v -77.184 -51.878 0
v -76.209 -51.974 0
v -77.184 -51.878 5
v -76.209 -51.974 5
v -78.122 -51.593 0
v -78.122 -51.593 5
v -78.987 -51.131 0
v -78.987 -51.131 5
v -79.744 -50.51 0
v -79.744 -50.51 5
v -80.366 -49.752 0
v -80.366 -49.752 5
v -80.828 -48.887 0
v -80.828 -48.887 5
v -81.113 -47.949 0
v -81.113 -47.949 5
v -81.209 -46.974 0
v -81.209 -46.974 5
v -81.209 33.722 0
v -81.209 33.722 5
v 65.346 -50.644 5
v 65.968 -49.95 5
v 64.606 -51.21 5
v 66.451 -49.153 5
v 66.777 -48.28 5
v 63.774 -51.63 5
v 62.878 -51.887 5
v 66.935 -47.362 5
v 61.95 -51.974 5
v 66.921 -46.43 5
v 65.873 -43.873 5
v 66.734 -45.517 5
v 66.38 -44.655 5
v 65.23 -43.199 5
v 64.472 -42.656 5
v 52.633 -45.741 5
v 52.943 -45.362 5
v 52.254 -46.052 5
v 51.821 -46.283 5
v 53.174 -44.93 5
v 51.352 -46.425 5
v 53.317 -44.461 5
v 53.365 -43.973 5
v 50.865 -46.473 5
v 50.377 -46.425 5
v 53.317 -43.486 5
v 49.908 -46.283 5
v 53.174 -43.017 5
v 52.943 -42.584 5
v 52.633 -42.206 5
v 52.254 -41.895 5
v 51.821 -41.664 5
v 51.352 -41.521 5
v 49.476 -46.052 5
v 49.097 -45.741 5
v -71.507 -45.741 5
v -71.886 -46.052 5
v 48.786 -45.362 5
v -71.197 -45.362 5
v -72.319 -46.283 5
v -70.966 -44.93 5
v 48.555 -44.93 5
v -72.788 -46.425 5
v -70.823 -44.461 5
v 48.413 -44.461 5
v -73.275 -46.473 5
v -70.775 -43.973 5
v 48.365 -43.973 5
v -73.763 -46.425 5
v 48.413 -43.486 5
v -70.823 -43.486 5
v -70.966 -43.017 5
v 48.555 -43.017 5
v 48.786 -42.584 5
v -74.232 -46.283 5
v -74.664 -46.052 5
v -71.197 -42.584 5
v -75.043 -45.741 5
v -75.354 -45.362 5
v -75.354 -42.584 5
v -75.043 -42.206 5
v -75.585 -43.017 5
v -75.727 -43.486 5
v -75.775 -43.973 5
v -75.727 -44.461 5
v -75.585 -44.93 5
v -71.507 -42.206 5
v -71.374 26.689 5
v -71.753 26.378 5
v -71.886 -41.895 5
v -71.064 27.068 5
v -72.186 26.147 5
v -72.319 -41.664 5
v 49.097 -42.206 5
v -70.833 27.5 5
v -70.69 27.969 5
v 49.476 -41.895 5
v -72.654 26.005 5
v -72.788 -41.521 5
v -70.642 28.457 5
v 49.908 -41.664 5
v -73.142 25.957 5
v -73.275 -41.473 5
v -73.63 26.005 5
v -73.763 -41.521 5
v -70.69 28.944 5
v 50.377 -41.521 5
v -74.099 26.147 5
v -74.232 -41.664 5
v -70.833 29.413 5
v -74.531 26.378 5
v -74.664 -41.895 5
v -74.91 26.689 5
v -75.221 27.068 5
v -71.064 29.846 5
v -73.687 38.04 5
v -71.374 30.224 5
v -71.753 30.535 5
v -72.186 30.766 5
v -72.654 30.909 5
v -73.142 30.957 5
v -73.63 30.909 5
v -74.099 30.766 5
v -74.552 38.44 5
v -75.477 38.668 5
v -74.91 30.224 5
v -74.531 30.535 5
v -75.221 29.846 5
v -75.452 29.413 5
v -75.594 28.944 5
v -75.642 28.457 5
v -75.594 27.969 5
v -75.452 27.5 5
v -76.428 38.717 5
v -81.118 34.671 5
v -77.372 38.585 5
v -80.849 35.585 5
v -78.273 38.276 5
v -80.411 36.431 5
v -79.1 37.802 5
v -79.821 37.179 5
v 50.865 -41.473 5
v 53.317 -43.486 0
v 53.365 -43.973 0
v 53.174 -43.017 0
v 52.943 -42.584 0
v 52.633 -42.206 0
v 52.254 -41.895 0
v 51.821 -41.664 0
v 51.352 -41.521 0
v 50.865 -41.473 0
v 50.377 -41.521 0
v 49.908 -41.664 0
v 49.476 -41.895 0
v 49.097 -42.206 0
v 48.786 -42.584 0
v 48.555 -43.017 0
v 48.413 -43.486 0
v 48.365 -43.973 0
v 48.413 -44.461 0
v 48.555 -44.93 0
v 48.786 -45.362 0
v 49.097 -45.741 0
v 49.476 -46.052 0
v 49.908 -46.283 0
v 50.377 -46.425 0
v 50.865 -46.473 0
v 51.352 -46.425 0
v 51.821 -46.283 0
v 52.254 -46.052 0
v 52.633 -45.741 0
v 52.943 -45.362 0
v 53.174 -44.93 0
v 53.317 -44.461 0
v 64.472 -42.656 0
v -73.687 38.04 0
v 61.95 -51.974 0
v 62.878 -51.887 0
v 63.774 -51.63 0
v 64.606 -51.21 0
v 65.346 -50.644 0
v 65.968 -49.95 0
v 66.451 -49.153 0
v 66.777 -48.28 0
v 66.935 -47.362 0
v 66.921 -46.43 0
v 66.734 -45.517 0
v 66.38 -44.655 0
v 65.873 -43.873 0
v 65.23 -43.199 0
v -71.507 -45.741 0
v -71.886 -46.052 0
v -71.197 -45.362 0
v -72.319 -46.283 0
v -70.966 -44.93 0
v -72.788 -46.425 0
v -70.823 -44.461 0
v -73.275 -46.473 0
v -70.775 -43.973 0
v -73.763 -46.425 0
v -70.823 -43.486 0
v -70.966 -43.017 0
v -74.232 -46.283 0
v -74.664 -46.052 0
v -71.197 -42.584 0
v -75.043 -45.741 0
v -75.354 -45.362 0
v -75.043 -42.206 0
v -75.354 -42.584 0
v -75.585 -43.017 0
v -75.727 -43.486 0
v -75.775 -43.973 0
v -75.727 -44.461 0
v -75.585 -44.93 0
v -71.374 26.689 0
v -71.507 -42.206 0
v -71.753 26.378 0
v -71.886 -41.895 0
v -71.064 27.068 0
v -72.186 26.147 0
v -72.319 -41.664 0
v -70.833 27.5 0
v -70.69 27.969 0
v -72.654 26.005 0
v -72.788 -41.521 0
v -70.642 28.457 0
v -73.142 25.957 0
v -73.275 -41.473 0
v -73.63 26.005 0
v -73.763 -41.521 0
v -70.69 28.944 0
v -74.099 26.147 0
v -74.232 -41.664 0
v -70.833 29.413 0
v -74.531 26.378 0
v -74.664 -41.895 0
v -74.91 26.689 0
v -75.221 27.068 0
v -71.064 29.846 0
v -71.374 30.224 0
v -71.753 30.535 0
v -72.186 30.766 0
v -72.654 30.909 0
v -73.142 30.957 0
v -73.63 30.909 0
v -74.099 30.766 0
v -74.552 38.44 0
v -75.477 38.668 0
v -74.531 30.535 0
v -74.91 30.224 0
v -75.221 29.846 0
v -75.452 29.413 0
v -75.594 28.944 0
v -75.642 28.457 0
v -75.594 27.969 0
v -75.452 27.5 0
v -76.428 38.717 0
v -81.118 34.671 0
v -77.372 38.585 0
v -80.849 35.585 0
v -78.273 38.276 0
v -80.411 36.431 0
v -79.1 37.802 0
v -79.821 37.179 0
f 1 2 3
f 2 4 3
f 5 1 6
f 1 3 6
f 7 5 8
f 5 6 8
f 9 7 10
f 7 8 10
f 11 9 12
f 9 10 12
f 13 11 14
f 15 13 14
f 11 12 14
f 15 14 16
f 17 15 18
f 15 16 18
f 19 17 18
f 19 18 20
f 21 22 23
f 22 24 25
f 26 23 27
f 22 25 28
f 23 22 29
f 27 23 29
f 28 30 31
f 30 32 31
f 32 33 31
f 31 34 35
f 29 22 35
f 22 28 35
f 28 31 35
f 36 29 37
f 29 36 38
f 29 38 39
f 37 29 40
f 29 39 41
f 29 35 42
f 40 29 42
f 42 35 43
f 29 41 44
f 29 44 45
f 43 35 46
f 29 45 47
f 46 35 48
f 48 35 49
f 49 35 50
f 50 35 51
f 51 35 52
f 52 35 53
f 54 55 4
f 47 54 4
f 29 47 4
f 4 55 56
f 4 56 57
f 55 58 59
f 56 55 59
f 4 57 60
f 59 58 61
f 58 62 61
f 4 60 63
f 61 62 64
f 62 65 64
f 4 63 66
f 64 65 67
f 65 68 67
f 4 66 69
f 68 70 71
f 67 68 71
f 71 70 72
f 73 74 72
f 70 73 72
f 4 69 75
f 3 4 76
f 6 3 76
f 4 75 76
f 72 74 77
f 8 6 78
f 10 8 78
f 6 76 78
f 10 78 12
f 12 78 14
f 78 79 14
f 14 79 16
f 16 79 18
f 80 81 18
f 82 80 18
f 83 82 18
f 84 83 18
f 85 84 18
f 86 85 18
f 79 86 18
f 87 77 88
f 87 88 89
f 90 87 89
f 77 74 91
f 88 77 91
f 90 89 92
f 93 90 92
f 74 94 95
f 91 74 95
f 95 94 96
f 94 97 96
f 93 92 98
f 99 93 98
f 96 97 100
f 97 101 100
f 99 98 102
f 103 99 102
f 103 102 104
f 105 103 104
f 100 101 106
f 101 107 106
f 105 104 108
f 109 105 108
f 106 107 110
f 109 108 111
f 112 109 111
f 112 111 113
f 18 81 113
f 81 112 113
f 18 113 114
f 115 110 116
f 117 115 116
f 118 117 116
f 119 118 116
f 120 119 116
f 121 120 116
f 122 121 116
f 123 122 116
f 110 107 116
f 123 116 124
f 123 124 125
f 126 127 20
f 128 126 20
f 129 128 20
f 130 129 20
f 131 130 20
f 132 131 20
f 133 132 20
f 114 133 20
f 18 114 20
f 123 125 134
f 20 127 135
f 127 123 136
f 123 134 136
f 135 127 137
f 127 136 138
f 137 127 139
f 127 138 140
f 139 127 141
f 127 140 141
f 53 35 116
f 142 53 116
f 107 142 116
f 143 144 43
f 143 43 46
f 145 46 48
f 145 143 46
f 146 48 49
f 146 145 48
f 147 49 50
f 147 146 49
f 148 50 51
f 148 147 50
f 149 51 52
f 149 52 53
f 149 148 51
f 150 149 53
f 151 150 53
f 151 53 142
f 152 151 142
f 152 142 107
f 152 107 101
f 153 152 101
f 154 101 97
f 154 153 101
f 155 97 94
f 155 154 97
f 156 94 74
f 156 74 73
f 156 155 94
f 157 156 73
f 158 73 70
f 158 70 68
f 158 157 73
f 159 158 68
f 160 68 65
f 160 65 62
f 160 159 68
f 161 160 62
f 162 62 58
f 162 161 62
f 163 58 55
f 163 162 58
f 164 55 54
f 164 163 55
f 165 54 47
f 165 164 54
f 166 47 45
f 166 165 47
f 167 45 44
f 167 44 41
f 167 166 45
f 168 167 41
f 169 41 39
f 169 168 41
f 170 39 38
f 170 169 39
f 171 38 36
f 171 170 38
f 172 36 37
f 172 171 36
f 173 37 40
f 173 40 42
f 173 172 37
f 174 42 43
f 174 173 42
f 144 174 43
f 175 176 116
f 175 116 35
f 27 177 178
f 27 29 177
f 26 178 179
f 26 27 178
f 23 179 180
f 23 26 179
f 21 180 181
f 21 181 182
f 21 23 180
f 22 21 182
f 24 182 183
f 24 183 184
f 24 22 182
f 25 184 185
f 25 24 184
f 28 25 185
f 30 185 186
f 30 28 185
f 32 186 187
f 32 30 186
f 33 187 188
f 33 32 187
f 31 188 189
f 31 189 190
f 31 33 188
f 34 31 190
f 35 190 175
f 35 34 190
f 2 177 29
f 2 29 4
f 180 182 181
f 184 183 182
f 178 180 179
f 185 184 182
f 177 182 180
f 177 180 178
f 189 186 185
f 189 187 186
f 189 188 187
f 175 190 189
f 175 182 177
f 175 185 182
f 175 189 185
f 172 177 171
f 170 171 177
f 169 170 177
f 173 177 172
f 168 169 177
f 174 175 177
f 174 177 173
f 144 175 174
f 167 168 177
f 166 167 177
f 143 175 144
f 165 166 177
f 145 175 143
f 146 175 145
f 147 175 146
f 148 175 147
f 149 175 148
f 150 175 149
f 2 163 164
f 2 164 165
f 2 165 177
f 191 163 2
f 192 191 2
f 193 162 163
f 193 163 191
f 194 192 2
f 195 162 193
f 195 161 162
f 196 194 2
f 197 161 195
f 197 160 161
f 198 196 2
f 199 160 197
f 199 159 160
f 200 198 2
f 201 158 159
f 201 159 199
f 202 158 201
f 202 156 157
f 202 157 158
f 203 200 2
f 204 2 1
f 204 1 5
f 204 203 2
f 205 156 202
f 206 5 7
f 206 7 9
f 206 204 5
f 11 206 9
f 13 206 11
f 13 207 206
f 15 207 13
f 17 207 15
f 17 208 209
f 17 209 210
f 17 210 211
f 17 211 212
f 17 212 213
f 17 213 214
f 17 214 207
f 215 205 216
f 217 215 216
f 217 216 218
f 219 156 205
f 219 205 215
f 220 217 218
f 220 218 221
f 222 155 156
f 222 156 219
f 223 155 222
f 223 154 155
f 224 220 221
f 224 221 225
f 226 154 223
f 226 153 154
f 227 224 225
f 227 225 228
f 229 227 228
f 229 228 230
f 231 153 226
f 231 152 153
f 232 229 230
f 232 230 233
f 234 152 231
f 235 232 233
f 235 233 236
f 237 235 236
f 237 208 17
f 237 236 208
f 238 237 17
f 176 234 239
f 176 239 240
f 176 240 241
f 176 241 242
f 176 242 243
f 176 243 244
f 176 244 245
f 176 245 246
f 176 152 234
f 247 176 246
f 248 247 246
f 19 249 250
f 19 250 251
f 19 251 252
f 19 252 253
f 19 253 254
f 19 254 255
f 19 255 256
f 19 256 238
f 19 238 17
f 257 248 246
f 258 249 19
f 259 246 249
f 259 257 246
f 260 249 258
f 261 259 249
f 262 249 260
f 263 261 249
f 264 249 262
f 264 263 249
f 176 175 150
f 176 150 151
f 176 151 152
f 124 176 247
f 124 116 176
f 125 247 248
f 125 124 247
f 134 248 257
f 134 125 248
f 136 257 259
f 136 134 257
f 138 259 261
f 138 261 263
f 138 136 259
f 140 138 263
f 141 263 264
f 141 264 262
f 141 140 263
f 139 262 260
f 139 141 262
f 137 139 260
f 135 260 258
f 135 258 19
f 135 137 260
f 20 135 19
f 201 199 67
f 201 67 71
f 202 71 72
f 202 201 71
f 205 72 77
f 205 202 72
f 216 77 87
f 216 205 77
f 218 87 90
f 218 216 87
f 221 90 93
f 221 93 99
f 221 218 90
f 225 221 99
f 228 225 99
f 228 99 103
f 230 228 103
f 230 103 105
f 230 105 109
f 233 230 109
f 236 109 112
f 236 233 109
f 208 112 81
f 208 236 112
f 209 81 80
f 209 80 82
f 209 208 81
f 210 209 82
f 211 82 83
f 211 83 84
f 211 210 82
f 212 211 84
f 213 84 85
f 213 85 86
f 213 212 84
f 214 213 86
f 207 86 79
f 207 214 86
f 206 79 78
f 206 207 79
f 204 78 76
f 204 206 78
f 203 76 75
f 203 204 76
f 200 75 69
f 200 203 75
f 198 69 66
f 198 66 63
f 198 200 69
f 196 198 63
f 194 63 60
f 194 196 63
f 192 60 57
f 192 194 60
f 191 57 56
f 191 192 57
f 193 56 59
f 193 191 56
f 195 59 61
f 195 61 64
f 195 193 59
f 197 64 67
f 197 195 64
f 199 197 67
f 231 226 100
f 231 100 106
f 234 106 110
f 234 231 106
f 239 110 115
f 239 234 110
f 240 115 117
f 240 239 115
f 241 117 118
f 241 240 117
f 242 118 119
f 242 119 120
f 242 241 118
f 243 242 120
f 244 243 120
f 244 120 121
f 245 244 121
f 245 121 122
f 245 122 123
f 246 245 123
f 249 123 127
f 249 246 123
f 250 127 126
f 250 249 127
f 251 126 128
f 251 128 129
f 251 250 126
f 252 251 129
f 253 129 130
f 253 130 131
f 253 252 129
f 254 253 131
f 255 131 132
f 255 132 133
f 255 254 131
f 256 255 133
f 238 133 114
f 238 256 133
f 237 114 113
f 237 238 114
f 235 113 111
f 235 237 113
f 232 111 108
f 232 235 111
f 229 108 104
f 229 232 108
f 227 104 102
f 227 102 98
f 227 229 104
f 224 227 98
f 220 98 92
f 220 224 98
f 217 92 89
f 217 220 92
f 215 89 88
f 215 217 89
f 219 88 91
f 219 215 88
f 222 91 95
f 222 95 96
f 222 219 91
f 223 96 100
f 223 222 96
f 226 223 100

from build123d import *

# Parameters (mm, degrees)
ESBO_O1_R                = 2.5
RESSALTO_EXTRUS_O1_DEPTH = 5
FILETE1_R                = 5


with BuildPart() as part:
    # Esboço1 → Ressalto-extrusão1 (new body)
    with BuildSketch(Plane.XY):
        Polygon((80.424614017, -51.973967516), (-81.208731643, -51.973967516), (-81.208731643, 42.432853022), align=None)
        with Locations((-73.142213803, 28.456719531)):
            Circle(ESBO_O1_R, mode=Mode.SUBTRACT)
        with Locations((50.864750517, -43.973280469)):
            Circle(ESBO_O1_R, mode=Mode.SUBTRACT)
        with Locations((-73.275249483, -43.973280469)):
            Circle(ESBO_O1_R, mode=Mode.SUBTRACT)
    extrude(amount=RESSALTO_EXTRUS_O1_DEPTH)

    # Filete1
    filete1_edges = [part.edges().sort_by_distance(p)[0] for p in [
        (-81.208731643, 42.432853022, 2.5),
        (80.424614017, -51.973967516, 2.5),
        (-81.208731643, -51.973967516, 2.5),
    ]]
    fillet(filete1_edges, radius=FILETE1_R)


solid = part.part
